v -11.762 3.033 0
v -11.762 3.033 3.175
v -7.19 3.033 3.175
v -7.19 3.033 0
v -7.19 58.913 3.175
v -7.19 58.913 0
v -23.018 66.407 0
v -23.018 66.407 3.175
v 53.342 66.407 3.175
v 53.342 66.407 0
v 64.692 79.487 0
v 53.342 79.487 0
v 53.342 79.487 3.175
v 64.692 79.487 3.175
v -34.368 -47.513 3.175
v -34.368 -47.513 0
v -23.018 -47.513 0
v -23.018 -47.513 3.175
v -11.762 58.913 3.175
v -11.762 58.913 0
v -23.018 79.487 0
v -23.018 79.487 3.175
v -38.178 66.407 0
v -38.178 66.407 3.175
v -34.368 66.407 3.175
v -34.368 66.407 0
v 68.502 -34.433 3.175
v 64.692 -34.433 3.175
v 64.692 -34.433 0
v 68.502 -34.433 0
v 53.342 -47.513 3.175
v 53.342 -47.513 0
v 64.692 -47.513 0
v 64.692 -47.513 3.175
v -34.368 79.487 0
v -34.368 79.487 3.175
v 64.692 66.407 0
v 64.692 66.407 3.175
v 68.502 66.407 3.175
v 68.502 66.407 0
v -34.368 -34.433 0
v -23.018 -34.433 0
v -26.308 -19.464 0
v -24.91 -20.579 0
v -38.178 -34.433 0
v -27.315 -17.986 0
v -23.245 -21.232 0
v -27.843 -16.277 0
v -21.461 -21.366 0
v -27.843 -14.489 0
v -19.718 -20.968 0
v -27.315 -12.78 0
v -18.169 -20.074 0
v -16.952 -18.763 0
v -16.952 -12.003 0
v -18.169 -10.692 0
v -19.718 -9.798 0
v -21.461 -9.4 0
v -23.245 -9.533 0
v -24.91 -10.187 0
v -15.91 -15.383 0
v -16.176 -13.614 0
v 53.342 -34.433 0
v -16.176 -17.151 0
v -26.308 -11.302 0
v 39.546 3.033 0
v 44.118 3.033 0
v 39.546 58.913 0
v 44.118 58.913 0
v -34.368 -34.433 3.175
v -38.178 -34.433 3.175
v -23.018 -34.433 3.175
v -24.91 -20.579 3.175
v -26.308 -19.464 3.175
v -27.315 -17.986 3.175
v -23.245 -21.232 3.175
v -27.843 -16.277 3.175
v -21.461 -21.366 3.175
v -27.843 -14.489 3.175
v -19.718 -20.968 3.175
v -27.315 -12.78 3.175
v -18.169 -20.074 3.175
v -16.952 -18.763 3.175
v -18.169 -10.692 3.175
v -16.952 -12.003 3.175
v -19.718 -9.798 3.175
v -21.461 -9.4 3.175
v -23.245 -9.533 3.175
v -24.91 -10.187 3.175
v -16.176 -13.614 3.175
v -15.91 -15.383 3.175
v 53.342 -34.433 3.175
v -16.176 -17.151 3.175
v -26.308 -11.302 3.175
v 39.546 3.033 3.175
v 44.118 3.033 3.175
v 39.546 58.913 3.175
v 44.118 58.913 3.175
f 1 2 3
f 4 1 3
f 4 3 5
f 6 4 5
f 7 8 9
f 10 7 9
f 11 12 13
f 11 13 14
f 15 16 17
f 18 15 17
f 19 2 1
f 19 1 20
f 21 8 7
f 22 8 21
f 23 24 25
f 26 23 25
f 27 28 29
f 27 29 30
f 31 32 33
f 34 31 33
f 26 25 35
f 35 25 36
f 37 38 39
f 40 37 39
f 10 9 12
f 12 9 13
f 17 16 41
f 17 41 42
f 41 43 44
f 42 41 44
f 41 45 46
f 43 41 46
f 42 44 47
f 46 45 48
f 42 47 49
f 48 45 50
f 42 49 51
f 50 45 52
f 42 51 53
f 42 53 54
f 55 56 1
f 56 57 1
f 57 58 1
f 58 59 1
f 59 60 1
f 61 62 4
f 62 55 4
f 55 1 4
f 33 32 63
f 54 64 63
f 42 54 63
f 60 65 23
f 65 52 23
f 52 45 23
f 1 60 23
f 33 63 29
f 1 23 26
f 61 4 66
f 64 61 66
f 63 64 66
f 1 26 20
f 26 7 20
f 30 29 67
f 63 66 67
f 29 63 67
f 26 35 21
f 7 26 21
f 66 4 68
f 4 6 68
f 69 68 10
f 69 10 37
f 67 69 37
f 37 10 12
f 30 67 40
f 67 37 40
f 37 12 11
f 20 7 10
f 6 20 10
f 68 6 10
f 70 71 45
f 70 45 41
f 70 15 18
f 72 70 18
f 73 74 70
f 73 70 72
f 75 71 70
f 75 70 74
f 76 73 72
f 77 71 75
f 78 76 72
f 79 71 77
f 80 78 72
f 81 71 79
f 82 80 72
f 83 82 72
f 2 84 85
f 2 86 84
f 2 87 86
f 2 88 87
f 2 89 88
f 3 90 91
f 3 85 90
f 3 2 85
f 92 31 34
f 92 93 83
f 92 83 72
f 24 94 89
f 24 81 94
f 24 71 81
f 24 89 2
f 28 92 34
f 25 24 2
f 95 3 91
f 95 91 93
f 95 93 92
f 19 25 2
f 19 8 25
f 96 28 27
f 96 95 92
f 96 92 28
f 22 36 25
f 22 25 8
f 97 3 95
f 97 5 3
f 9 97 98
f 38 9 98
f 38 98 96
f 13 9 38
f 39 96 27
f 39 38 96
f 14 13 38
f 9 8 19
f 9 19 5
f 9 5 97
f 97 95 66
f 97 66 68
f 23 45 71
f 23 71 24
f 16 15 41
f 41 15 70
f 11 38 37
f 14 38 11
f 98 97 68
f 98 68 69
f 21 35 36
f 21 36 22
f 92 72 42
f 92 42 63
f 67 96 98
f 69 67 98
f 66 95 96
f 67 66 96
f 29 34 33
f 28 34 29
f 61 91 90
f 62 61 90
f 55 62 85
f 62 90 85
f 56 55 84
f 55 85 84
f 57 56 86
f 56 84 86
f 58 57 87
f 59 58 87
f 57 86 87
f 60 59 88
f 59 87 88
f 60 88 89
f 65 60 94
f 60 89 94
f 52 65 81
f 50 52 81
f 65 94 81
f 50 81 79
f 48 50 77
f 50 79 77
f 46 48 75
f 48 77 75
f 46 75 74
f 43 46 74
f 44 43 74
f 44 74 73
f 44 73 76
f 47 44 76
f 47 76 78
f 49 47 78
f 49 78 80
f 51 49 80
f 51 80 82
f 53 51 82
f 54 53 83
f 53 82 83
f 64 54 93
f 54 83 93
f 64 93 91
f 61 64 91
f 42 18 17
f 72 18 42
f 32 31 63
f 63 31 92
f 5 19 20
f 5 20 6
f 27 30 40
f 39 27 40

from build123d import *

# Parameters (mm, degrees)
SKETCH1_W           = 106.68
SKETCH1_H           = 127
BOSS_EXTRUDE1_DEPTH = 3.175
SKETCH2_W           = 4.572
SKETCH2_H           = 55.88
CUT_EXTRUDE1_DEPTH  = 3.175
SKETCH3_W           = 3.81
SKETCH3_H           = 13.0800094
SKETCH3_W_2         = 76.36002
CUT_EXTRUDE2_DEPTH  = 3.175
SKETCH4_R           = 5.999999938
CUT_EXTRUDE3_DEPTH  = 3.175


with BuildPart() as part:
    # Sketch1 → Boss-Extrude1 (new body)
    with BuildSketch(Plane.XY):
        with Locations((15.161716065, 15.987172316)):
            Rectangle(SKETCH1_W, SKETCH1_H)
    extrude(amount=BOSS_EXTRUDE1_DEPTH)

    # Sketch2 → Cut-Extrude1 (cut)
    with BuildSketch(Plane.XY.offset(3.175)):
        with Locations((-9.476283935, 30.973172316)):
            Rectangle(SKETCH2_W, SKETCH2_H)
        with Locations((41.831716065, 30.973172316)):
            Rectangle(SKETCH2_W, SKETCH2_H)
    extrude(amount=-CUT_EXTRUDE1_DEPTH, mode=Mode.SUBTRACT)

    # Sketch3 → Cut-Extrude2 (cut)
    with BuildSketch(Plane.XY.offset(3.175)):
        with Locations((-36.273283935, 72.947167616)):
            Rectangle(SKETCH3_W, SKETCH3_H)
        with Locations((15.161716065, 72.947167616)):
            Rectangle(SKETCH3_W_2, SKETCH3_H)
        with Locations((-36.273283935, -40.972822984)):
            Rectangle(SKETCH3_W, SKETCH3_H)
        with Locations((66.596716065, 72.947167616)):
            Rectangle(SKETCH3_W, SKETCH3_H)
        with Locations((15.161716065, -40.972822984)):
            Rectangle(SKETCH3_W_2, SKETCH3_H)
        with Locations((66.596716065, -40.972822984)):
            Rectangle(SKETCH3_W, SKETCH3_H)
    extrude(amount=-CUT_EXTRUDE2_DEPTH, mode=Mode.SUBTRACT)

    # Sketch4 → Cut-Extrude3 (cut)
    with BuildSketch(Plane.XY.offset(3.175)):
        with Locations((-21.909583935, -15.382818284)):
            Circle(SKETCH4_R)
    extrude(amount=-CUT_EXTRUDE3_DEPTH, mode=Mode.SUBTRACT)


solid = part.part
